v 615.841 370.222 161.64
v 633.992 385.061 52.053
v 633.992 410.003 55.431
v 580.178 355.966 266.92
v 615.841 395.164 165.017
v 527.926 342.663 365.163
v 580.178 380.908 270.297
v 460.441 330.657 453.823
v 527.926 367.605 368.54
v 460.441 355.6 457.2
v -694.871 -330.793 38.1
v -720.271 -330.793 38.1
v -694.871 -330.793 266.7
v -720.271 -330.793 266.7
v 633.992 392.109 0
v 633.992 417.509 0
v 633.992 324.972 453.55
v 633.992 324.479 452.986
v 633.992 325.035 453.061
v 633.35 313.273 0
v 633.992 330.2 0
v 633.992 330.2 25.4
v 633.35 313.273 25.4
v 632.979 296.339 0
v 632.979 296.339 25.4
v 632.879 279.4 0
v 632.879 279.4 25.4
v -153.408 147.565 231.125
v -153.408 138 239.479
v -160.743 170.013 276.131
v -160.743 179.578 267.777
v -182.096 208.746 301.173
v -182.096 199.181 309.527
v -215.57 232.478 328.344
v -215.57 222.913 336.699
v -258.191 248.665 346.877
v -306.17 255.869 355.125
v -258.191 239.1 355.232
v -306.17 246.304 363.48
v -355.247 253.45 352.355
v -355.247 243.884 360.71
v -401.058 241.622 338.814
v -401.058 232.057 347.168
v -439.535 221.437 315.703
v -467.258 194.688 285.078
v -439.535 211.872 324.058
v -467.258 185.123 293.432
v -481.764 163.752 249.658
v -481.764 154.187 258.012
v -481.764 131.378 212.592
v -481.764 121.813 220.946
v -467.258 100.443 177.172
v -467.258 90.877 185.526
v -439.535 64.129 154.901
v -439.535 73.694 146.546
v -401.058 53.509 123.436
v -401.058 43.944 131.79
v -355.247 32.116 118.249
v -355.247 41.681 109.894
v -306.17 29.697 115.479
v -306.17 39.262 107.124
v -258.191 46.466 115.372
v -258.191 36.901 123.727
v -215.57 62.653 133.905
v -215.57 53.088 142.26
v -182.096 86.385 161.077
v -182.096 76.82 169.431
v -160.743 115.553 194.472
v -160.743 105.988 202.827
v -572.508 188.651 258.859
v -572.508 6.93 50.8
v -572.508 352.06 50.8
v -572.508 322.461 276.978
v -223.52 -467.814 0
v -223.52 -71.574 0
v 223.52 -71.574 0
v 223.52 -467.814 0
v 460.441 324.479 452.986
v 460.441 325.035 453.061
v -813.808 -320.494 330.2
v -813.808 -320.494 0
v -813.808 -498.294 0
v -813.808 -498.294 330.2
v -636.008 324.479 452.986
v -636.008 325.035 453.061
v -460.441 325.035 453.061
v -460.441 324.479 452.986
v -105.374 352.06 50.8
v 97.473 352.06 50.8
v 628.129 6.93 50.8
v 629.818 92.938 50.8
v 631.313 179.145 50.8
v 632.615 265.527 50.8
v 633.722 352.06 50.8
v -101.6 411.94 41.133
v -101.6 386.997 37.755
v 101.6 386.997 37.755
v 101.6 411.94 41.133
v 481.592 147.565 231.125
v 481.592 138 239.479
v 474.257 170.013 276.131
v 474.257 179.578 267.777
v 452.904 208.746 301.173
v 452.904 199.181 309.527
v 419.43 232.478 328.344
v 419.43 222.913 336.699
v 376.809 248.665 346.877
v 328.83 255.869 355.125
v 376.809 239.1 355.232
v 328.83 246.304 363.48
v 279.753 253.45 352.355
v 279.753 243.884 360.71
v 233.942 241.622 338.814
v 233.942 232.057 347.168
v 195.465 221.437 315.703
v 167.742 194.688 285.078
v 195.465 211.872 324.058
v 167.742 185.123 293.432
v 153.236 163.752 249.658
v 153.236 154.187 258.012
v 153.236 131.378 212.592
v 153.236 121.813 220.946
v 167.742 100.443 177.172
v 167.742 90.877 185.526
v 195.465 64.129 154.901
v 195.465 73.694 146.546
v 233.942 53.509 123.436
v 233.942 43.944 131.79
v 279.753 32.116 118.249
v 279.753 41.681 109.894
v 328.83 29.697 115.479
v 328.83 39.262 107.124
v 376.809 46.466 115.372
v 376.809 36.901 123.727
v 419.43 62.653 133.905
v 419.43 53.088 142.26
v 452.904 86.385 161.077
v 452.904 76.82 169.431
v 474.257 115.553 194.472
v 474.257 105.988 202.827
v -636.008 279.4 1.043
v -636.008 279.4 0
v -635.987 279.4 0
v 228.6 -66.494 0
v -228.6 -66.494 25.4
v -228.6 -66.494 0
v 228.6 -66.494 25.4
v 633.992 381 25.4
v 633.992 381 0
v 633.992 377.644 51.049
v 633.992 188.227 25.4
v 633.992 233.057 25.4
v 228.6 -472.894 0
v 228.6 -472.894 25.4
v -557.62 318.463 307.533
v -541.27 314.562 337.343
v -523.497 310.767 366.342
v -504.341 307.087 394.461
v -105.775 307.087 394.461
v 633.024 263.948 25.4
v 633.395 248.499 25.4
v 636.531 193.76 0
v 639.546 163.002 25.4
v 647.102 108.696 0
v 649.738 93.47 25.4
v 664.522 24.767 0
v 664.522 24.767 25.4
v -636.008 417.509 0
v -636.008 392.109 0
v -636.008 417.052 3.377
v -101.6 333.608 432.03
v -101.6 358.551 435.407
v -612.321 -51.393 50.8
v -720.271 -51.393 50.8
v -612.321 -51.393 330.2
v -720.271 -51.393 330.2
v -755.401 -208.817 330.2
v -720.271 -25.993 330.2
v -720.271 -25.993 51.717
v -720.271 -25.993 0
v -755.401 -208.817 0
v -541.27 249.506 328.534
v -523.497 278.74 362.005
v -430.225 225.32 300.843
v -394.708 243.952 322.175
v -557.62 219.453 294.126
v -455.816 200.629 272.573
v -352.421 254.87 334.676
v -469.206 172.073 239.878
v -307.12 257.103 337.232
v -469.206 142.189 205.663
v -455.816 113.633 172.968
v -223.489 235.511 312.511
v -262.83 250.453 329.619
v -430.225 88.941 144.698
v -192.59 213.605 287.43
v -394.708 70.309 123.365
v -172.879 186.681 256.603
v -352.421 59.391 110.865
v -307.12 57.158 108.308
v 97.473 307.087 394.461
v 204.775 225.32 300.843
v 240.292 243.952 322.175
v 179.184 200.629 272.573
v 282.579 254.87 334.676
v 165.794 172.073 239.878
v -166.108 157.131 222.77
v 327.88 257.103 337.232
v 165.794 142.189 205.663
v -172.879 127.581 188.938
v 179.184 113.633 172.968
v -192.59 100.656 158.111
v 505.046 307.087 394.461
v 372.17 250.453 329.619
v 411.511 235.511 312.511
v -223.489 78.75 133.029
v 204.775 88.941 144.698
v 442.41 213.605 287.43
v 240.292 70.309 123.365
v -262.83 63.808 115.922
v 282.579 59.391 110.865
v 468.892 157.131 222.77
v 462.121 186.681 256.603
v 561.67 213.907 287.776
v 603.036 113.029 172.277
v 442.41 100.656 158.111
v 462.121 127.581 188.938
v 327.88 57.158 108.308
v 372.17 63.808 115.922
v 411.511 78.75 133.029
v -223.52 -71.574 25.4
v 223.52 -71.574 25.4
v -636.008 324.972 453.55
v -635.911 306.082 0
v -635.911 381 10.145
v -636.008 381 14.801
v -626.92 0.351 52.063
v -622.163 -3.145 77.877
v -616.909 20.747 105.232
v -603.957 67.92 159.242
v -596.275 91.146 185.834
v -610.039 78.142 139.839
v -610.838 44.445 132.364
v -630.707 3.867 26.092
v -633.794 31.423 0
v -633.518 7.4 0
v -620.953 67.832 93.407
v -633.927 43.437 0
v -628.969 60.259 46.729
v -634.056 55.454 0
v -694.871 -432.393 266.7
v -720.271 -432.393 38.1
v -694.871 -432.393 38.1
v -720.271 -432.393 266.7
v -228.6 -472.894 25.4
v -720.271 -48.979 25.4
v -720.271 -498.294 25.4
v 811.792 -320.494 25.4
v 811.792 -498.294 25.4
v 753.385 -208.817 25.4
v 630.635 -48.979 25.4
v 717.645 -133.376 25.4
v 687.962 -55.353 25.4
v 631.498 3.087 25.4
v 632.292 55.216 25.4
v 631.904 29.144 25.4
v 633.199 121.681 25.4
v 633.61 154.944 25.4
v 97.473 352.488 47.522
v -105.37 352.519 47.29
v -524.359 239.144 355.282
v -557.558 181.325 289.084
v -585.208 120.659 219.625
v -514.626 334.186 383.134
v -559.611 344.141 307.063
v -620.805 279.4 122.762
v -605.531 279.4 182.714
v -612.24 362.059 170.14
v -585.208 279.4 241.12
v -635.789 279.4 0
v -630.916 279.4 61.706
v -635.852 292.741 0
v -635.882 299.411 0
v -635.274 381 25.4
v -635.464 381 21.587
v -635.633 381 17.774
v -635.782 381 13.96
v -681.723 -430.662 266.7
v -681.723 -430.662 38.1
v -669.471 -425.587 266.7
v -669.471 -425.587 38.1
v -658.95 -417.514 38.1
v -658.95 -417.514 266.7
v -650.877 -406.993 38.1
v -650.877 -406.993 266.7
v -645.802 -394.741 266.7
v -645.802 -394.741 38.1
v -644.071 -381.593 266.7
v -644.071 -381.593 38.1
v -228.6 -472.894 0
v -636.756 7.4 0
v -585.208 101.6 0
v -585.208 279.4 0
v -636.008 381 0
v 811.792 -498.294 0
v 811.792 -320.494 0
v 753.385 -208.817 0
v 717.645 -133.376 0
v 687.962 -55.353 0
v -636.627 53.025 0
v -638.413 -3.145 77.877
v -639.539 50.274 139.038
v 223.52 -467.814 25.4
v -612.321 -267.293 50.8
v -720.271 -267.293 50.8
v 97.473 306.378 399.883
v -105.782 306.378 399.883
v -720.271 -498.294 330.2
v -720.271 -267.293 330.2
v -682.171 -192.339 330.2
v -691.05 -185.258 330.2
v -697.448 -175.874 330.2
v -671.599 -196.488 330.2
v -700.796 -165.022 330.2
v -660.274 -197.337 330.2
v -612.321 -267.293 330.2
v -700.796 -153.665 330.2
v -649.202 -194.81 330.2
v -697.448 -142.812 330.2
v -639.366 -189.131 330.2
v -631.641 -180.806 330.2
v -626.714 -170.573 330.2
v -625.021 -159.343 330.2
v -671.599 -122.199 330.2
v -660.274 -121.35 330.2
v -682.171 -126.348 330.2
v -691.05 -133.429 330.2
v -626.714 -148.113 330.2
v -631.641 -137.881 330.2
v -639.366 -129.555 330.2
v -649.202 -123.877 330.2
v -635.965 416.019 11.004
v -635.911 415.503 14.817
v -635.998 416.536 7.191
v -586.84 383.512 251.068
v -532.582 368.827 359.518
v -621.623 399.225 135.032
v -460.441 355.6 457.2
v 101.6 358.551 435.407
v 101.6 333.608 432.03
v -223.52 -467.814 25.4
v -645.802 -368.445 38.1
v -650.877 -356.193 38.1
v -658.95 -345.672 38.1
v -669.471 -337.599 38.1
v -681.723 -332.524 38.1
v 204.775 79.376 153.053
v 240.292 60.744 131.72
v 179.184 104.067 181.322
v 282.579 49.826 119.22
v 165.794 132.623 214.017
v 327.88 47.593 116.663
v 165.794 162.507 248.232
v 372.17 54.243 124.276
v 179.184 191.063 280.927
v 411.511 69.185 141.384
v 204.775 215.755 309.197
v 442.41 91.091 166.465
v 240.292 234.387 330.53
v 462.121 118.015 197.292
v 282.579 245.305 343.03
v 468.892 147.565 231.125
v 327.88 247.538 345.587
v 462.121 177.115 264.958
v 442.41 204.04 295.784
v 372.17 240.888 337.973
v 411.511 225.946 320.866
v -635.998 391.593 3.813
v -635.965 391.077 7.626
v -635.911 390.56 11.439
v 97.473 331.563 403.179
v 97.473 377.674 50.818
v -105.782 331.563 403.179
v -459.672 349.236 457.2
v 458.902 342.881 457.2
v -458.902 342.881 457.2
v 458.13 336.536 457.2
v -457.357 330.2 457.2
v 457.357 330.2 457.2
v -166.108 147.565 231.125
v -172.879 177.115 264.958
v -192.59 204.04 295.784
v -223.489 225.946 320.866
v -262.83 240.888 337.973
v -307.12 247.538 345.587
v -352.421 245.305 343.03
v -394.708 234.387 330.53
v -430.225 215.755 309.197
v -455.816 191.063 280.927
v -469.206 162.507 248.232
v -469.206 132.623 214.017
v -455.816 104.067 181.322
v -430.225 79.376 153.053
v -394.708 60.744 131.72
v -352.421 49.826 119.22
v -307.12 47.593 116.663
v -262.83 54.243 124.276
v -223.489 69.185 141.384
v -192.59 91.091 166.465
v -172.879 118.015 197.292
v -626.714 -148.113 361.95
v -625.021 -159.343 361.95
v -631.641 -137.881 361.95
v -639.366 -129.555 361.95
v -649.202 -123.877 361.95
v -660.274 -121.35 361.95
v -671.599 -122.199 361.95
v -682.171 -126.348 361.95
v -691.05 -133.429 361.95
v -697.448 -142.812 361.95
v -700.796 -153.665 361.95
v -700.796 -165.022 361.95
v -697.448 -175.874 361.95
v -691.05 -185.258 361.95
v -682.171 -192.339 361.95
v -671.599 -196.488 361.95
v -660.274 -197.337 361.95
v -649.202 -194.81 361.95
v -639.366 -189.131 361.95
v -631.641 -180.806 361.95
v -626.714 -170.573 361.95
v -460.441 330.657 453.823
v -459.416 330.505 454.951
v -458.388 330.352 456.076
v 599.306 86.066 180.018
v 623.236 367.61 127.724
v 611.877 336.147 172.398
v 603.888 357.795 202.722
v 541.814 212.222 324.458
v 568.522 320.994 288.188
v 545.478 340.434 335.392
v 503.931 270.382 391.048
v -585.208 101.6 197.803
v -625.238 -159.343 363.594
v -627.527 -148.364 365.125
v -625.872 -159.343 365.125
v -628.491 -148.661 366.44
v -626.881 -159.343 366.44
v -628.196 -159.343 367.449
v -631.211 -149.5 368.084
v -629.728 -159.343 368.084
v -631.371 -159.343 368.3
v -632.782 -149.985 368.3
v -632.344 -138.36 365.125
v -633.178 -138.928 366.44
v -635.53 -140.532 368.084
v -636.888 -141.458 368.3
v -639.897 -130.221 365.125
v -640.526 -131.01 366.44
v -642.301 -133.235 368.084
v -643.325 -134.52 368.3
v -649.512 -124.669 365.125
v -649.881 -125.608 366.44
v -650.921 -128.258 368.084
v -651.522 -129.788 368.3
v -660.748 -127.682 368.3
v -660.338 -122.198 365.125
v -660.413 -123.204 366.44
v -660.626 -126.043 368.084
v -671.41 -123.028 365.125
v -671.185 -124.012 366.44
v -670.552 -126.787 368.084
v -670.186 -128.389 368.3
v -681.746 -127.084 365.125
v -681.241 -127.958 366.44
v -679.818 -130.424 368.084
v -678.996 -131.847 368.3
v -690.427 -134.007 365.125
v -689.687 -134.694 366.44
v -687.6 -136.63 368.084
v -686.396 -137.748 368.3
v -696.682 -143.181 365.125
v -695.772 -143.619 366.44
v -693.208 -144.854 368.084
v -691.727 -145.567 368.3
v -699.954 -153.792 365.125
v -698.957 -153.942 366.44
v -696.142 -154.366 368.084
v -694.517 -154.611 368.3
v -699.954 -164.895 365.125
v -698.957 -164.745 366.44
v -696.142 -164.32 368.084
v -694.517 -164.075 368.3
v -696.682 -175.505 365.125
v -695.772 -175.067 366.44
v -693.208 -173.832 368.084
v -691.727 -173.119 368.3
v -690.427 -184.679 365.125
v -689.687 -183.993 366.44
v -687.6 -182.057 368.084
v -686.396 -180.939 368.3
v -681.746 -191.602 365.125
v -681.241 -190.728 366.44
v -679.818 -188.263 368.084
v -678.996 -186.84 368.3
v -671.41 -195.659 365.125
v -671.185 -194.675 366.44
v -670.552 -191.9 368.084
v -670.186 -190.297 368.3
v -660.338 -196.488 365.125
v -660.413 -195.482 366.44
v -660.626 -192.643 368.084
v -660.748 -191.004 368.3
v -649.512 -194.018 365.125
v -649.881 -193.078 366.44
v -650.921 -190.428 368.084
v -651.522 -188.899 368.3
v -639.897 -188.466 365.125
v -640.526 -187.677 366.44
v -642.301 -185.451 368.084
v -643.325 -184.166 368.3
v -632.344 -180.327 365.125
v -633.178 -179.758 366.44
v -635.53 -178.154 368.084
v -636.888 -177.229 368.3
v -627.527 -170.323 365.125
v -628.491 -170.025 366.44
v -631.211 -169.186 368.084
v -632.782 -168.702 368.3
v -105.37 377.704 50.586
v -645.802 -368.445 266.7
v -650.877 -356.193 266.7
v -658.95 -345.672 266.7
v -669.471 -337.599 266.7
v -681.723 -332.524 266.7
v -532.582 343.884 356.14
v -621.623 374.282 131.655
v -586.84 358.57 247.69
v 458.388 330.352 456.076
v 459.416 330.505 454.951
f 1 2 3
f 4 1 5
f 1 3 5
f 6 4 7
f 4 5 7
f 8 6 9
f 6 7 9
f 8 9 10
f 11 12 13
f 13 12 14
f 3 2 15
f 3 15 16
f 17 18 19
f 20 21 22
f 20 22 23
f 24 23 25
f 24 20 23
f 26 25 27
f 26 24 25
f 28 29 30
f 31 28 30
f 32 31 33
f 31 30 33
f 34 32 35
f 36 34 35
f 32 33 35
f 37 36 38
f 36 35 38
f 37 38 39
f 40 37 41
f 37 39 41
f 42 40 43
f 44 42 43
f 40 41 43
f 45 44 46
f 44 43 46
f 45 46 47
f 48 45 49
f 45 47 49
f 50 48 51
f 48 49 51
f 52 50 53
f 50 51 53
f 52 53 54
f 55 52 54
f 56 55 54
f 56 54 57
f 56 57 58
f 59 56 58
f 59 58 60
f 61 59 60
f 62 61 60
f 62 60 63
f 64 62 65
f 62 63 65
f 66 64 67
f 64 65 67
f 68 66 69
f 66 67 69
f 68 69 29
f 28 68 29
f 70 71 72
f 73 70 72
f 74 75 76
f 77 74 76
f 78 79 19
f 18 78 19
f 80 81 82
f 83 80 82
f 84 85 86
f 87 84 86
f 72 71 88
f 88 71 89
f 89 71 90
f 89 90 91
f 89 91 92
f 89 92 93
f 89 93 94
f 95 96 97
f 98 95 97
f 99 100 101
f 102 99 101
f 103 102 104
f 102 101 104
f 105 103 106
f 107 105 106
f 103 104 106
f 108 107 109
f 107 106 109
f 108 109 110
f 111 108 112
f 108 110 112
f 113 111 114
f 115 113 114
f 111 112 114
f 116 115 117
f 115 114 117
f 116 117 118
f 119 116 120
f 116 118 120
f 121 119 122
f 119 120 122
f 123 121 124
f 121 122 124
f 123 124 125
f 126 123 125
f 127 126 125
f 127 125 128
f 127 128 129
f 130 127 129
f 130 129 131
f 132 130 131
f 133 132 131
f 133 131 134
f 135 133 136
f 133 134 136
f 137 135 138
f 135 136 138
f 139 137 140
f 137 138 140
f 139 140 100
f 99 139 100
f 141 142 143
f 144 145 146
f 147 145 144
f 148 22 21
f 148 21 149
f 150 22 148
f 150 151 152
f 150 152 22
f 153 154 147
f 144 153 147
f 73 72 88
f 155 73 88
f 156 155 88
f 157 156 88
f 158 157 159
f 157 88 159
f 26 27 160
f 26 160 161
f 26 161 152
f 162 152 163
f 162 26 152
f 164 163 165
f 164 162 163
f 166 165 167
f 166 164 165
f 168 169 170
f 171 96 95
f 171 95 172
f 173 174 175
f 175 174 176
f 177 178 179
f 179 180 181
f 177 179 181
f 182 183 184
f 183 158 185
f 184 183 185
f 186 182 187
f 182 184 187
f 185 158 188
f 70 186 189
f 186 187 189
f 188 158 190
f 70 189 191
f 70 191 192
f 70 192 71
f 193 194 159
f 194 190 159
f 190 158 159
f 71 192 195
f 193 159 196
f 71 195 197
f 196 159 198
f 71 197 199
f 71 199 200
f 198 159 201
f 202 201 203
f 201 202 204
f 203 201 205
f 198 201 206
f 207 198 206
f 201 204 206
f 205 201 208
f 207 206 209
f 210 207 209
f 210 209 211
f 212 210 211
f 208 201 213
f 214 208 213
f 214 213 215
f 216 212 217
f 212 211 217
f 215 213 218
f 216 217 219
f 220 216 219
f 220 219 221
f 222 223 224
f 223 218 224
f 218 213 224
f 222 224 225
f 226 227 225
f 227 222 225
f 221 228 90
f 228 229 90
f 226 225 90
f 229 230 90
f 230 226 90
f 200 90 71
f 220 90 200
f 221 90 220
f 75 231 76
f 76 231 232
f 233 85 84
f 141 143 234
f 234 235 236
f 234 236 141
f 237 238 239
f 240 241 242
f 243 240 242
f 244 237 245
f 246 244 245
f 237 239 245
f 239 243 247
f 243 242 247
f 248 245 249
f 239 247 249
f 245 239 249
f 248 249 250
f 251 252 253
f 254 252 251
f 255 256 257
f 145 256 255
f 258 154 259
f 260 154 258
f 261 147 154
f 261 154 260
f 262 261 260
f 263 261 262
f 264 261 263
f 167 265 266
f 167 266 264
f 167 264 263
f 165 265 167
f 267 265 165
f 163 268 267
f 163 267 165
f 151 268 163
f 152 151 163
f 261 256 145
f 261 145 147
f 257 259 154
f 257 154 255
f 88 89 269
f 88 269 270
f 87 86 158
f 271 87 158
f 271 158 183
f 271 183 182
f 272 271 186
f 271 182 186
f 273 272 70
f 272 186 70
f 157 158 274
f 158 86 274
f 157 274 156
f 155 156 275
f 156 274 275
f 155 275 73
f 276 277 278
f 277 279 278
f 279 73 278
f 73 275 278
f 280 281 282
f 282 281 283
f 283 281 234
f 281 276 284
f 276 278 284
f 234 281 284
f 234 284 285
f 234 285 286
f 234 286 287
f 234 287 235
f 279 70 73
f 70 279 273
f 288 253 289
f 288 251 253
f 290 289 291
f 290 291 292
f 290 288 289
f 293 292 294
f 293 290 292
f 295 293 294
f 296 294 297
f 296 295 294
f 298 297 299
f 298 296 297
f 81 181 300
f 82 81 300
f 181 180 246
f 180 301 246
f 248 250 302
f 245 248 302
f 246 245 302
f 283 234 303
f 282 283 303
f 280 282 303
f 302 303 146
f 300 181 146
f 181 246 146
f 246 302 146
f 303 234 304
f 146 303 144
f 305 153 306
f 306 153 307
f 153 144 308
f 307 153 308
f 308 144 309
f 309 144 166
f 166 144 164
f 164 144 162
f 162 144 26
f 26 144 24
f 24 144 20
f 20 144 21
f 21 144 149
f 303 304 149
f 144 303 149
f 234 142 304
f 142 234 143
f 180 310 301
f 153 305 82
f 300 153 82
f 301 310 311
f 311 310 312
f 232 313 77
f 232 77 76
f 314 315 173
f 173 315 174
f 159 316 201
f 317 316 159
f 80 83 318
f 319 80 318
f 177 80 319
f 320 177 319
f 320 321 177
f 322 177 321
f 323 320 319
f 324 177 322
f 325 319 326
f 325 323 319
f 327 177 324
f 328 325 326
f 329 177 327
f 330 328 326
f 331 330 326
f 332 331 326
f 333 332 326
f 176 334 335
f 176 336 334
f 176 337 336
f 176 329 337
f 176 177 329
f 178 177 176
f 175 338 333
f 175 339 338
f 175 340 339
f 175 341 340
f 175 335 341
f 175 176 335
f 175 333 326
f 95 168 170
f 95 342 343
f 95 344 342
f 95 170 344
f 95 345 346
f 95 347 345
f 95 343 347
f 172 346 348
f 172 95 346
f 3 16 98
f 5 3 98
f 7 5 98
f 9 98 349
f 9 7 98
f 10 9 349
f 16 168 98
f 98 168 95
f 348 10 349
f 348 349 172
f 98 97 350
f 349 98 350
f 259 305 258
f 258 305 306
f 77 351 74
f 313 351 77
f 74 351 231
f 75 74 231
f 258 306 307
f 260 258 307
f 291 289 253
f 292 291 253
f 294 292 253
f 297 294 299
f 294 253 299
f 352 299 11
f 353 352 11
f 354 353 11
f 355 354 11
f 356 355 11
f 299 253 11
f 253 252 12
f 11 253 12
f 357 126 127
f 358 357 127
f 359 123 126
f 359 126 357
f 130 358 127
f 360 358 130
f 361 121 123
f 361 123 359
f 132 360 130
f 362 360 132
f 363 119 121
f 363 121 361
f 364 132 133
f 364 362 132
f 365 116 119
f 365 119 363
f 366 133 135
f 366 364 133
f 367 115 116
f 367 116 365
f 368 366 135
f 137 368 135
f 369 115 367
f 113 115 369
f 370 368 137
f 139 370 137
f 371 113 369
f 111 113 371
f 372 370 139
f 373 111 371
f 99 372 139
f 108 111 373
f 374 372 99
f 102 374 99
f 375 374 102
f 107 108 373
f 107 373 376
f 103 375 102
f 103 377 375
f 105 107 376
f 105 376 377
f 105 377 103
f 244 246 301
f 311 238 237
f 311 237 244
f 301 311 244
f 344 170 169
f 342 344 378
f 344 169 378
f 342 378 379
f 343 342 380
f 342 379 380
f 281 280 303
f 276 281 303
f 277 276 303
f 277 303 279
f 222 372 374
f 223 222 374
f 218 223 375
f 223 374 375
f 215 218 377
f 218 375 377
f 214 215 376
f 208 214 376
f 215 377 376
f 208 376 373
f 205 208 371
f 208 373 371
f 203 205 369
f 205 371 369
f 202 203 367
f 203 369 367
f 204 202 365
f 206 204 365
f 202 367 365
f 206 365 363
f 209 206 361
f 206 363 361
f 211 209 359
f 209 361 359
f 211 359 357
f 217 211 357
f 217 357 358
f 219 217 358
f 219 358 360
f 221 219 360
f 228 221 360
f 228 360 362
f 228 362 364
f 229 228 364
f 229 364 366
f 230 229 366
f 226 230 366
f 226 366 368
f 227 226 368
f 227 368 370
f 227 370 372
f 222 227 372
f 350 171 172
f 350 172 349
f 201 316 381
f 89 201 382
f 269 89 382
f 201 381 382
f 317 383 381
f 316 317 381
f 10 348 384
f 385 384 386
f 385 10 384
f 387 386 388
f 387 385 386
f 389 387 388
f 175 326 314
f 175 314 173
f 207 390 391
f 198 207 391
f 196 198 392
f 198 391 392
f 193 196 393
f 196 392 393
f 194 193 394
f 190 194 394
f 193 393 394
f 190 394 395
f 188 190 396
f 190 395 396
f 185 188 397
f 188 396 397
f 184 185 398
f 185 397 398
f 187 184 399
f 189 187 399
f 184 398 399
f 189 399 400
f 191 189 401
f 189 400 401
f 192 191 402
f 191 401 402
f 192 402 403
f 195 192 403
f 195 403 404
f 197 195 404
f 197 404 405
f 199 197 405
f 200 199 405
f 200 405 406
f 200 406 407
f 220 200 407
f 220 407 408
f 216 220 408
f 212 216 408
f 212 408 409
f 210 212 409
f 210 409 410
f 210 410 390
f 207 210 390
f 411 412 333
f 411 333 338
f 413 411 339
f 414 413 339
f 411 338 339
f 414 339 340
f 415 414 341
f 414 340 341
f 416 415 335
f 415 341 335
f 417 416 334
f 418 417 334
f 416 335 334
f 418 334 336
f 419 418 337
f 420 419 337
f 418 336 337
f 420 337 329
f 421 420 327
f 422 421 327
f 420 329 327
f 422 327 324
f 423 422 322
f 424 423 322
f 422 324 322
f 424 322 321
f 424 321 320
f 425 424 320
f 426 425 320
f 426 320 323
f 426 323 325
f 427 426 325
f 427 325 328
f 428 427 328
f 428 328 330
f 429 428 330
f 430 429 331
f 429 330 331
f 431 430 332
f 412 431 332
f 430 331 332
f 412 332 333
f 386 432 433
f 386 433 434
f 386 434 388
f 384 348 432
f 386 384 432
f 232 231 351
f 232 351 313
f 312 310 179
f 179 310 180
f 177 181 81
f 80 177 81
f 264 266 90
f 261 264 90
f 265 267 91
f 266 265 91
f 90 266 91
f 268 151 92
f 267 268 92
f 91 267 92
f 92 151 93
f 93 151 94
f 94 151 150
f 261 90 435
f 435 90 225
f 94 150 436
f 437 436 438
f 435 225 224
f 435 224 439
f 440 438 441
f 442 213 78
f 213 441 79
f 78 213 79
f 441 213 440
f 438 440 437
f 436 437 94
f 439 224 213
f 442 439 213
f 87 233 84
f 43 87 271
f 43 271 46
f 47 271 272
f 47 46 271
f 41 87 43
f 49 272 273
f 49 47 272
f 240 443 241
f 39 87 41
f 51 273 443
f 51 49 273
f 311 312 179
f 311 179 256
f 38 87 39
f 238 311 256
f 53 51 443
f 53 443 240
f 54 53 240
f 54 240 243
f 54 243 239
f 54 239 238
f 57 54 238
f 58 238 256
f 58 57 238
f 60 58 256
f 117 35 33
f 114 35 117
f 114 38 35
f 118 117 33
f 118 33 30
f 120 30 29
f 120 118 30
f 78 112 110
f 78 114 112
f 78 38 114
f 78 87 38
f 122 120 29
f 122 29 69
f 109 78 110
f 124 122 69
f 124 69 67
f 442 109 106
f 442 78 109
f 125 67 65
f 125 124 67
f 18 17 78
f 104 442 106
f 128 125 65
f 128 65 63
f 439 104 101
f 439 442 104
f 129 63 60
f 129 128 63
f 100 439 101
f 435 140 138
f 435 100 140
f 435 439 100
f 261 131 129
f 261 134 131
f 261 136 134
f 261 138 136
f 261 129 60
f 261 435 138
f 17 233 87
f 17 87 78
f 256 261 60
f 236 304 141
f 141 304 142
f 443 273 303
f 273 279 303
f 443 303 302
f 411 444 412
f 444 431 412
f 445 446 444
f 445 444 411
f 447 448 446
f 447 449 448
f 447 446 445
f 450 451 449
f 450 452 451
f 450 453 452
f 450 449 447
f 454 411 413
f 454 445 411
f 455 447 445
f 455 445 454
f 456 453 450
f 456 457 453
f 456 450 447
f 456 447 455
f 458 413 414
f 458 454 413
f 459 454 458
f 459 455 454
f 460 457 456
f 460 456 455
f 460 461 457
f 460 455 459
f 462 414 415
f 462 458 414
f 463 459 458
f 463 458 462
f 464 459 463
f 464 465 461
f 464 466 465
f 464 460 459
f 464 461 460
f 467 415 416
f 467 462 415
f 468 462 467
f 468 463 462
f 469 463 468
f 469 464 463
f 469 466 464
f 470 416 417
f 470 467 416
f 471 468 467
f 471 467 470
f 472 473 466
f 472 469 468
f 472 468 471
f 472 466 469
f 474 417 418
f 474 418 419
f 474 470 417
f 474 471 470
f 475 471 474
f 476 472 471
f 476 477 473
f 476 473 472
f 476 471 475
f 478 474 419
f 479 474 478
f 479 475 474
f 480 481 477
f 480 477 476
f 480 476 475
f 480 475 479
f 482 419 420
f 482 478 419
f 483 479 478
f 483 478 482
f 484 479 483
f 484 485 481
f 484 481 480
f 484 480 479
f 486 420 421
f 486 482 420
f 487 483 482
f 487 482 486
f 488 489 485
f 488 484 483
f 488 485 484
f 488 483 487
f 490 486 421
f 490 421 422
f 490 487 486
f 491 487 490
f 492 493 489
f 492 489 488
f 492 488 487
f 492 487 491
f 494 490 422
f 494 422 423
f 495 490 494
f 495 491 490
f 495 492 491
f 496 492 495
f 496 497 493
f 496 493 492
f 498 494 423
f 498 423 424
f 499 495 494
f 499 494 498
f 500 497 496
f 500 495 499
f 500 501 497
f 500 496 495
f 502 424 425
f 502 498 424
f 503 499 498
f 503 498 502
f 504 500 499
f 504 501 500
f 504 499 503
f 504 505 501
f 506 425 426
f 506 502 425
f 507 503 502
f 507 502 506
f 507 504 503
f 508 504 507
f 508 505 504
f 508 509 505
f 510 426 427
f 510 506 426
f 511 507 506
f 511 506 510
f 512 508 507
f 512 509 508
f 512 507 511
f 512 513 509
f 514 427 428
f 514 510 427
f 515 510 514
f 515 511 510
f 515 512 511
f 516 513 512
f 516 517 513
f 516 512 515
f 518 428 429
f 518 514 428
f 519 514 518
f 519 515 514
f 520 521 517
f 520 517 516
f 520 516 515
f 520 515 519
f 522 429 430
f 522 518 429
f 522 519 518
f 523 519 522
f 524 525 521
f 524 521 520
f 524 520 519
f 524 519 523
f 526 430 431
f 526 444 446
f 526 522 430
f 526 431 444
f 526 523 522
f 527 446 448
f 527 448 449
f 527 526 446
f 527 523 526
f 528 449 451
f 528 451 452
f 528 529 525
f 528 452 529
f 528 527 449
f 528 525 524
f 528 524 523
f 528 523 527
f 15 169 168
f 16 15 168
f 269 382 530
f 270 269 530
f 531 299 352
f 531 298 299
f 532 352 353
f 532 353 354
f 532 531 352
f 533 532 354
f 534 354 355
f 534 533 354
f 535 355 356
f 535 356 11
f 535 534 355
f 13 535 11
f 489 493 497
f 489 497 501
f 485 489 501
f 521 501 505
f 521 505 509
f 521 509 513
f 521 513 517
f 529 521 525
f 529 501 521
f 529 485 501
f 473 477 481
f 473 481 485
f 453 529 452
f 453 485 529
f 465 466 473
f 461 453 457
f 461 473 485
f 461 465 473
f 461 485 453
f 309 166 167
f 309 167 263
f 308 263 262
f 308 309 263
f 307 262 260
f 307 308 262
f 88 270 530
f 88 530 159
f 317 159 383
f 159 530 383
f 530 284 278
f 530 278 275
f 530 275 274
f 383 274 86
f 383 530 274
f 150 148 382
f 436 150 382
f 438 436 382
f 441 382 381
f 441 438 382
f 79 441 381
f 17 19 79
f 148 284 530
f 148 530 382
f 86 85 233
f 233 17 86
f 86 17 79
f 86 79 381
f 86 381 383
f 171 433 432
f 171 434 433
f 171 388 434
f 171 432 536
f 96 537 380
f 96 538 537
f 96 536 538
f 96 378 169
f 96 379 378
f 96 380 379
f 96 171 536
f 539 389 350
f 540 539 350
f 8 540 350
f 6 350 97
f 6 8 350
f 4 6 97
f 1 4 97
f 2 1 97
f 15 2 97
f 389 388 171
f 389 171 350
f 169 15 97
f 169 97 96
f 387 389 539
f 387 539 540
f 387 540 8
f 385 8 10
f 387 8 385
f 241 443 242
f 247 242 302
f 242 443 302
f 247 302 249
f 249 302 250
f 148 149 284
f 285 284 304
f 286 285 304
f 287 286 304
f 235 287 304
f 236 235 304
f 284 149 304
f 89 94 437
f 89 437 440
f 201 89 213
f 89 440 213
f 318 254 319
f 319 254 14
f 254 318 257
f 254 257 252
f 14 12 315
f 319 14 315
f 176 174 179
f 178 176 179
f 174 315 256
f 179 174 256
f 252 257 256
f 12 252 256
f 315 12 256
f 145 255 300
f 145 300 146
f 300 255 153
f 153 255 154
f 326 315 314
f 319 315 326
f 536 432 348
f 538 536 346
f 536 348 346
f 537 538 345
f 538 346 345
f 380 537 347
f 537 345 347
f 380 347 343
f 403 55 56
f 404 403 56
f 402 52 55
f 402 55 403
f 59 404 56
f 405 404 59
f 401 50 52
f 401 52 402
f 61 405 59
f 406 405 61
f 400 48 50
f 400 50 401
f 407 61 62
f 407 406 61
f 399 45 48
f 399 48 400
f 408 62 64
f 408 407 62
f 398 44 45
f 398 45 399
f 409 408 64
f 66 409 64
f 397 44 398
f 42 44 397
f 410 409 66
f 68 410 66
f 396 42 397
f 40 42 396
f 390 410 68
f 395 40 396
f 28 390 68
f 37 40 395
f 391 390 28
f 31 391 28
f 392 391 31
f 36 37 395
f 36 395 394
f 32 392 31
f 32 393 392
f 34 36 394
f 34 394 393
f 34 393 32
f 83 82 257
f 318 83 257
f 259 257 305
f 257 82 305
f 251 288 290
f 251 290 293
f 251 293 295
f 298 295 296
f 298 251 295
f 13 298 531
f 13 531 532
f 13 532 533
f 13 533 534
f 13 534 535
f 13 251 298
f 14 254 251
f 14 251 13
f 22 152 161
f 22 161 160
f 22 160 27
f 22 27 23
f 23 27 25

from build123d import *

# Parameters (mm, degrees)
F1_DEPTH  = 25.4
F3_DEPTH  = 1270
F5_W      = 457.2
F5_H      = 406.4
F6_DEPTH  = 25.4
F7_W      = 447.04
F7_H      = 396.24
F8_DEPTH  = 25.4
F10_DEPTH = 1358.9
F11_R     = 165.1
F12_DEPTH = 12.7
F14_DEPTH = 1206.5
F16_DEPTH = 25.4
F17_R     = 152.4
F18_DEPTH = 25.4
F4_W      = 203.2
F4_H      = 397.8725210062
F19_DEPTH = 25.4
F21_DEPTH = 25.4
F23_DEPTH = 459.74
F24_W     = 185.8009562355
F24_H     = 25.4
F25_DEPTH = 127
F27_DEPTH = 25.4
F29_DEPTH = 25.4
F31_DEPTH = 304.8
F32_W     = 215.9
F32_H     = 279.4
F33_DEPTH = 107.95
F34_W     = 101.6
F34_H     = 228.6
F35_DEPTH = 76.2
F36_R     = 50.8
F37_R     = 50.79999
F38_R     = 38.1
F39_DEPTH = 38.1
F40_R     = 6.35
F42_DEPTH = 508
F44_DEPTH = 406.4


# Not quite as in the source:
# - a fillet or chamfer is up to 0.001 mm smaller than in the source, because OpenCascade refuses the exact size


with BuildPart() as f1:
    # F0 (on Top) → F1 (new body)
    with BuildSketch(Plane.XY):
        Polygon((633.9916200739, 381), (-636.0083799261, 381), (-636.0083799261, 279.4), (-585.2083799261, 279.4), (-585.2083799261, 101.6), (-720.2711577423, -25.9932654437), (-755.401483878, -208.8168415053), (-813.8083799261, -320.4935488224), (-813.8083799261, -498.2935488224), (-636.0083799261, -498.2935488224), (633.9916200739, -498.2935488224), (811.7916200739, -498.2935488224), (811.7916200739, -320.4935488224), (753.3847240259, -208.8168415053), (718.2543978901, -25.9932654437), (583.1916200739, 101.6), (583.1916200739, 279.4), (633.9916200739, 279.4), align=None)
    extrude(amount=F1_DEPTH)

    # F5 (on face) → F6 (cut)
    with BuildSketch(Plane.XY.offset(25.4)):
        with Locations((0, -269.6935488224)):
            Rectangle(F5_W, F5_H)
    extrude(amount=-F6_DEPTH, mode=Mode.SUBTRACT)


with BuildPart() as f3:
    # F2 (on face) → F3 (new body)
    with BuildSketch(Plane.YZ.offset(633.9916200739)):
        Polygon((355.6, 457.2), (330.2, 457.2), (392.1093138361, 0), (417.5093138361, 0), align=None)
    extrude(amount=-F3_DEPTH)

    # F4 (on face) → F19 (cut)
    with BuildSketch(Plane(origin=(0, 385.0491351938, 52.1393870364), x_dir=(1, 0, 0), z_dir=(0, -0.9909562863, -0.1341850913))):
        with Locations((0, 184.4210364421)):
            Rectangle(F4_W, F4_H)
    extrude(amount=-F19_DEPTH, mode=Mode.SUBTRACT)

    # F20 (on face) → F21 (cut)
    with BuildSketch(Plane(origin=(0, 385.0491351938, 52.1393870364), x_dir=(1, 0, 0), z_dir=(0, -0.9909562863, -0.1341850913))):
        with BuildLine():
            ThreePointArc((-636.0083799261, -52.615224061), (-589.7862100298, 194.7614898935), (-457.3568999767, 408.7572969452))
            Line((-457.3568999767, 408.7572969452), (-636.0083799261, 408.7572969452))
            Line((-636.0083799261, 408.7572969452), (-636.0083799261, -52.615224061))
        make_face()
        with BuildLine():
            Line((633.9916200739, 408.7572969452), (457.3568999767, 408.7572969452))
            ThreePointArc((457.3568999767, 408.7572969452), (579.8251172789, 219.089488202), (633.9916200739, -0.0869975296))
            Line((633.9916200739, -0.0869975296), (633.9916200739, 408.7572969452))
        make_face()
    extrude(amount=-F21_DEPTH, mode=Mode.SUBTRACT)


with BuildPart() as f8:
    # F7 (on face) → F8 (new body)
    with BuildSketch(Plane.XY.offset(25.4)):
        with Locations((0, -269.6935488224)):
            Rectangle(F7_W, F7_H)
    extrude(amount=-F8_DEPTH)


with BuildPart() as f10:
    # F9 (on face) → F10 (new body)
    with BuildSketch(Plane.YZ.offset(633.9916200739)):
        Polygon((137.9962750452, 239.4747816958), (381, 25.4), (324.9715128924, 453.5495633916), align=None)
        Polygon((-48.9789628019, 25.4), (381, 25.4), (137.9962750452, 239.4747816958), align=None)
    extrude(amount=-F10_DEPTH)

    # F11 (on face) → F12 (cut)
    with BuildSketch(Plane(origin=(0, -40.3685730448, 35.2583498477), x_dir=(1, 0, 0), z_dir=(0, -0.7531695417, 0.6578264524))):
        with Locations((-318.5083799261, 271.1485742475)):
            Circle(F11_R)
        with Locations((316.4916200739, 271.1485742475)):
            Circle(F11_R)
    extrude(amount=-F12_DEPTH, mode=Mode.SUBTRACT)

    # F13 (on face) → F14 (cut)
    with BuildSketch(Plane.YZ.offset(633.9916200739)):
        Polygon((352.0595440659, 50.8), (307.0873524009, 394.4613269455), (6.9298194327, 50.8), align=None)
    extrude(amount=-F14_DEPTH, mode=Mode.SUBTRACT)

    # F15 (on face) → F16 (cut)
    with BuildSketch(Plane(origin=(0, 377.8532138761, 49.446608691), x_dir=(-1, 0, 0), z_dir=(0, 0.9915460014, 0.1297556441))):
        Polygon((105.7816183023, 356.7483680457), (-97.4728635717, 356.7483680457), (-97.4728635717, 1.383348692), (105.3700960746, 1.1486061652), align=None)
    extrude(amount=-F16_DEPTH, mode=Mode.SUBTRACT)

    # F17 (on face) → F18 (cut)
    with BuildSketch(Plane(origin=(0, -30.8033198656, 26.9039539021), x_dir=(1, 0, 0), z_dir=(0, -0.7531695417, 0.6578264524))):
        with Locations((-318.5083799261, 271.1485742475)):
            Circle(F17_R)
        with Locations((316.4916200739, 271.1485742475)):
            Circle(F17_R)
    extrude(amount=-F18_DEPTH, mode=Mode.SUBTRACT)


with BuildPart() as f23_tool:
    # F22 (on face) → F23 (new body)
    with BuildSketch(Plane(origin=(0, 409.9917919704, 55.5168646529), x_dir=(-1, 0, 0), z_dir=(0, 0.9909562863, 0.1341850913))):
        with BuildLine():
            ThreePointArc((-633.9916200739, -0.0869975295), (-580.1776273816, 216.7403618545), (-460.4411130957, 405.3489956272))
            Line((-460.4411130957, 405.3489956272), (-652.6208519936, 405.3489956272))
            Line((-652.6208519936, 405.3489956272), (-633.9916200739, -0.0869975295))
        make_face()
    extrude(amount=-F23_DEPTH)


with BuildPart() as f1_1:
    add(f1.part)

    # F23: cut by f23_tool
    add(f23_tool.part, mode=Mode.SUBTRACT)



with BuildPart() as f3_1:
    add(f3.part)

    # F23: cut by f23_tool
    add(f23_tool.part, mode=Mode.SUBTRACT)


with BuildPart() as f10_1:
    add(f10.part)

    # F23: cut by f23_tool
    add(f23_tool.part, mode=Mode.SUBTRACT)


with BuildPart() as f1_2:
    add(f1_1.part)

    add(f10_1.part)  # F25 merges F10
    # F24 (on face) → F25 (join)
    with BuildSketch(Plane(origin=(325.7420855468, 344.8115445011, 0), x_dir=(-0.726921866, 0.6867201764, 0), z_dir=(0.6867201764, 0.726921866, 0))):
        with Locations((-447.0644489093, 12.7)):
            Rectangle(F24_W, F24_H)
    extrude(amount=-F25_DEPTH)

    # F26 (on face) → F27 (join)
    with BuildSketch(Plane(origin=(0, 0, 0), x_dir=(1, 0, 0), z_dir=(0, 0, -1))):
        with BuildLine():
            ThreePointArc((633.9916200739, -330.2), (657.9193133131, -52.7687190683), (753.3847240259, 208.8168415053))
            Line((753.3847240259, 208.8168415053), (533.1680178642, 208.8168415053))
            Line((533.1680178642, 208.8168415053), (533.1680178642, -330.2))
            Line((533.1680178642, -330.2), (633.9916200739, -330.2))
        make_face()
    extrude(amount=-F27_DEPTH)

    # F28 (on face) → F29 (cut)
    with BuildSketch(Plane(origin=(0, 0, 0), x_dir=(1, 0, 0), z_dir=(0, 0, -1))):
        with BuildLine():
            Line((763.2642388344, -52.6611953974), (753.3847240259, 208.8168415053))
            ThreePointArc((753.3847240259, 208.8168415053), (657.9193133131, -52.7687190683), (633.9916200739, -330.2))
            Line((633.9916200739, -330.2), (763.2642388344, -52.6611953974))
        make_face()
    extrude(amount=-F29_DEPTH, mode=Mode.SUBTRACT)

    # F30 (on face) → F31 (join)
    with BuildSketch(Plane.XY.offset(25.4)):
        Polygon((-720.2711577423, -498.2935488224), (-720.2711577423, -25.9932654437), (-745.6711577423, -158.1787400112), (-755.401483878, -208.8168415053), (-813.8083799261, -320.4935488224), (-813.8083799261, -498.2935488224), (-745.6711577423, -498.2935488224), align=None)
    extrude(amount=F31_DEPTH)

    # F32 (on face) → F33 (join)
    with BuildSketch(Plane.YZ.offset(-720.2711577423)):
        with Locations((-159.3432654437, 190.5)):
            Rectangle(F32_W, F32_H)
    extrude(amount=F33_DEPTH)

    # F34 (on face) → F35 (join)
    with BuildSketch(Plane.YZ.offset(-720.2711577423)):
        with Locations((-381.5932654437, 152.4)):
            Rectangle(F34_W, F34_H)
    extrude(amount=F35_DEPTH)

    # F36
    f36_edges = [f1_2.edges().sort_by_distance(p)[0] for p in [
        (-644.071158, -432.393265, 152.4),
    ]]
    fillet(f36_edges, radius=F36_R)

    # F37 (radius 50.8 in the source; OpenCascade refuses exactly that, so slightly less here)
    f37_edges = [f1_2.edges().sort_by_distance(p)[0] for p in [
        (-644.071158, -330.793265, 152.4),
    ]]
    fillet(f37_edges, radius=F37_R)

    # F38 (on face) → F39 (join)
    with BuildSketch(Plane.XY.offset(330.2)):
        with Locations((-663.1211577423, -159.3432654437)):
            Circle(F38_R)
    extrude(amount=F39_DEPTH)

    # F40
    f40_edges = [f1_2.edges().sort_by_distance(p)[0] for p in [
        (-701.221158, -159.343265, 368.3),
    ]]
    fillet(f40_edges, radius=F40_R)

    # F41 (on face) → F42 (cut)
    with BuildSketch(Plane(origin=(0, 0, 0), x_dir=(1, 0, 0), z_dir=(0, 0, -1))):
        Polygon((-751.9905567169, -381), (-636.0083799261, -381), (-636.0083799261, -279.4), (-585.2083799261, -279.4), (-585.2083799261, -101.6), (-720.2711577423, 25.9932654437), (-724.7296735254, 49.1960616901), (-755.401483878, 78.8422897458), align=None)
    extrude(amount=-F42_DEPTH, mode=Mode.SUBTRACT)


with BuildPart() as f44_tool:
    # F43 (on face) → F44 (new body)
    with BuildSketch(Plane(origin=(0, 409.9917919704, 55.5168646529), x_dir=(-1, 0, 0), z_dir=(0, 0.9909562863, 0.1341850913))):
        with BuildLine():
            ThreePointArc((460.4411130957, 405.3489956272), (586.8395822523, 197.335702788), (635.9111193057, -41.0716948618))
            Line((635.9111193057, -41.0716948618), (645.3213691711, 405.3489956272))
            Line((645.3213691711, 405.3489956272), (460.4411130957, 405.3489956272))
        make_face()
    extrude(amount=-F44_DEPTH)


with BuildPart() as f1_3:
    add(f1_2.part)

    # F44: cut by f44_tool
    add(f44_tool.part, mode=Mode.SUBTRACT)


with BuildPart() as f3_2:
    add(f3_1.part)

    # F44: cut by f44_tool
    add(f44_tool.part, mode=Mode.SUBTRACT)


solid = Compound([f8.part, f1_3.part, f3_2.part])
